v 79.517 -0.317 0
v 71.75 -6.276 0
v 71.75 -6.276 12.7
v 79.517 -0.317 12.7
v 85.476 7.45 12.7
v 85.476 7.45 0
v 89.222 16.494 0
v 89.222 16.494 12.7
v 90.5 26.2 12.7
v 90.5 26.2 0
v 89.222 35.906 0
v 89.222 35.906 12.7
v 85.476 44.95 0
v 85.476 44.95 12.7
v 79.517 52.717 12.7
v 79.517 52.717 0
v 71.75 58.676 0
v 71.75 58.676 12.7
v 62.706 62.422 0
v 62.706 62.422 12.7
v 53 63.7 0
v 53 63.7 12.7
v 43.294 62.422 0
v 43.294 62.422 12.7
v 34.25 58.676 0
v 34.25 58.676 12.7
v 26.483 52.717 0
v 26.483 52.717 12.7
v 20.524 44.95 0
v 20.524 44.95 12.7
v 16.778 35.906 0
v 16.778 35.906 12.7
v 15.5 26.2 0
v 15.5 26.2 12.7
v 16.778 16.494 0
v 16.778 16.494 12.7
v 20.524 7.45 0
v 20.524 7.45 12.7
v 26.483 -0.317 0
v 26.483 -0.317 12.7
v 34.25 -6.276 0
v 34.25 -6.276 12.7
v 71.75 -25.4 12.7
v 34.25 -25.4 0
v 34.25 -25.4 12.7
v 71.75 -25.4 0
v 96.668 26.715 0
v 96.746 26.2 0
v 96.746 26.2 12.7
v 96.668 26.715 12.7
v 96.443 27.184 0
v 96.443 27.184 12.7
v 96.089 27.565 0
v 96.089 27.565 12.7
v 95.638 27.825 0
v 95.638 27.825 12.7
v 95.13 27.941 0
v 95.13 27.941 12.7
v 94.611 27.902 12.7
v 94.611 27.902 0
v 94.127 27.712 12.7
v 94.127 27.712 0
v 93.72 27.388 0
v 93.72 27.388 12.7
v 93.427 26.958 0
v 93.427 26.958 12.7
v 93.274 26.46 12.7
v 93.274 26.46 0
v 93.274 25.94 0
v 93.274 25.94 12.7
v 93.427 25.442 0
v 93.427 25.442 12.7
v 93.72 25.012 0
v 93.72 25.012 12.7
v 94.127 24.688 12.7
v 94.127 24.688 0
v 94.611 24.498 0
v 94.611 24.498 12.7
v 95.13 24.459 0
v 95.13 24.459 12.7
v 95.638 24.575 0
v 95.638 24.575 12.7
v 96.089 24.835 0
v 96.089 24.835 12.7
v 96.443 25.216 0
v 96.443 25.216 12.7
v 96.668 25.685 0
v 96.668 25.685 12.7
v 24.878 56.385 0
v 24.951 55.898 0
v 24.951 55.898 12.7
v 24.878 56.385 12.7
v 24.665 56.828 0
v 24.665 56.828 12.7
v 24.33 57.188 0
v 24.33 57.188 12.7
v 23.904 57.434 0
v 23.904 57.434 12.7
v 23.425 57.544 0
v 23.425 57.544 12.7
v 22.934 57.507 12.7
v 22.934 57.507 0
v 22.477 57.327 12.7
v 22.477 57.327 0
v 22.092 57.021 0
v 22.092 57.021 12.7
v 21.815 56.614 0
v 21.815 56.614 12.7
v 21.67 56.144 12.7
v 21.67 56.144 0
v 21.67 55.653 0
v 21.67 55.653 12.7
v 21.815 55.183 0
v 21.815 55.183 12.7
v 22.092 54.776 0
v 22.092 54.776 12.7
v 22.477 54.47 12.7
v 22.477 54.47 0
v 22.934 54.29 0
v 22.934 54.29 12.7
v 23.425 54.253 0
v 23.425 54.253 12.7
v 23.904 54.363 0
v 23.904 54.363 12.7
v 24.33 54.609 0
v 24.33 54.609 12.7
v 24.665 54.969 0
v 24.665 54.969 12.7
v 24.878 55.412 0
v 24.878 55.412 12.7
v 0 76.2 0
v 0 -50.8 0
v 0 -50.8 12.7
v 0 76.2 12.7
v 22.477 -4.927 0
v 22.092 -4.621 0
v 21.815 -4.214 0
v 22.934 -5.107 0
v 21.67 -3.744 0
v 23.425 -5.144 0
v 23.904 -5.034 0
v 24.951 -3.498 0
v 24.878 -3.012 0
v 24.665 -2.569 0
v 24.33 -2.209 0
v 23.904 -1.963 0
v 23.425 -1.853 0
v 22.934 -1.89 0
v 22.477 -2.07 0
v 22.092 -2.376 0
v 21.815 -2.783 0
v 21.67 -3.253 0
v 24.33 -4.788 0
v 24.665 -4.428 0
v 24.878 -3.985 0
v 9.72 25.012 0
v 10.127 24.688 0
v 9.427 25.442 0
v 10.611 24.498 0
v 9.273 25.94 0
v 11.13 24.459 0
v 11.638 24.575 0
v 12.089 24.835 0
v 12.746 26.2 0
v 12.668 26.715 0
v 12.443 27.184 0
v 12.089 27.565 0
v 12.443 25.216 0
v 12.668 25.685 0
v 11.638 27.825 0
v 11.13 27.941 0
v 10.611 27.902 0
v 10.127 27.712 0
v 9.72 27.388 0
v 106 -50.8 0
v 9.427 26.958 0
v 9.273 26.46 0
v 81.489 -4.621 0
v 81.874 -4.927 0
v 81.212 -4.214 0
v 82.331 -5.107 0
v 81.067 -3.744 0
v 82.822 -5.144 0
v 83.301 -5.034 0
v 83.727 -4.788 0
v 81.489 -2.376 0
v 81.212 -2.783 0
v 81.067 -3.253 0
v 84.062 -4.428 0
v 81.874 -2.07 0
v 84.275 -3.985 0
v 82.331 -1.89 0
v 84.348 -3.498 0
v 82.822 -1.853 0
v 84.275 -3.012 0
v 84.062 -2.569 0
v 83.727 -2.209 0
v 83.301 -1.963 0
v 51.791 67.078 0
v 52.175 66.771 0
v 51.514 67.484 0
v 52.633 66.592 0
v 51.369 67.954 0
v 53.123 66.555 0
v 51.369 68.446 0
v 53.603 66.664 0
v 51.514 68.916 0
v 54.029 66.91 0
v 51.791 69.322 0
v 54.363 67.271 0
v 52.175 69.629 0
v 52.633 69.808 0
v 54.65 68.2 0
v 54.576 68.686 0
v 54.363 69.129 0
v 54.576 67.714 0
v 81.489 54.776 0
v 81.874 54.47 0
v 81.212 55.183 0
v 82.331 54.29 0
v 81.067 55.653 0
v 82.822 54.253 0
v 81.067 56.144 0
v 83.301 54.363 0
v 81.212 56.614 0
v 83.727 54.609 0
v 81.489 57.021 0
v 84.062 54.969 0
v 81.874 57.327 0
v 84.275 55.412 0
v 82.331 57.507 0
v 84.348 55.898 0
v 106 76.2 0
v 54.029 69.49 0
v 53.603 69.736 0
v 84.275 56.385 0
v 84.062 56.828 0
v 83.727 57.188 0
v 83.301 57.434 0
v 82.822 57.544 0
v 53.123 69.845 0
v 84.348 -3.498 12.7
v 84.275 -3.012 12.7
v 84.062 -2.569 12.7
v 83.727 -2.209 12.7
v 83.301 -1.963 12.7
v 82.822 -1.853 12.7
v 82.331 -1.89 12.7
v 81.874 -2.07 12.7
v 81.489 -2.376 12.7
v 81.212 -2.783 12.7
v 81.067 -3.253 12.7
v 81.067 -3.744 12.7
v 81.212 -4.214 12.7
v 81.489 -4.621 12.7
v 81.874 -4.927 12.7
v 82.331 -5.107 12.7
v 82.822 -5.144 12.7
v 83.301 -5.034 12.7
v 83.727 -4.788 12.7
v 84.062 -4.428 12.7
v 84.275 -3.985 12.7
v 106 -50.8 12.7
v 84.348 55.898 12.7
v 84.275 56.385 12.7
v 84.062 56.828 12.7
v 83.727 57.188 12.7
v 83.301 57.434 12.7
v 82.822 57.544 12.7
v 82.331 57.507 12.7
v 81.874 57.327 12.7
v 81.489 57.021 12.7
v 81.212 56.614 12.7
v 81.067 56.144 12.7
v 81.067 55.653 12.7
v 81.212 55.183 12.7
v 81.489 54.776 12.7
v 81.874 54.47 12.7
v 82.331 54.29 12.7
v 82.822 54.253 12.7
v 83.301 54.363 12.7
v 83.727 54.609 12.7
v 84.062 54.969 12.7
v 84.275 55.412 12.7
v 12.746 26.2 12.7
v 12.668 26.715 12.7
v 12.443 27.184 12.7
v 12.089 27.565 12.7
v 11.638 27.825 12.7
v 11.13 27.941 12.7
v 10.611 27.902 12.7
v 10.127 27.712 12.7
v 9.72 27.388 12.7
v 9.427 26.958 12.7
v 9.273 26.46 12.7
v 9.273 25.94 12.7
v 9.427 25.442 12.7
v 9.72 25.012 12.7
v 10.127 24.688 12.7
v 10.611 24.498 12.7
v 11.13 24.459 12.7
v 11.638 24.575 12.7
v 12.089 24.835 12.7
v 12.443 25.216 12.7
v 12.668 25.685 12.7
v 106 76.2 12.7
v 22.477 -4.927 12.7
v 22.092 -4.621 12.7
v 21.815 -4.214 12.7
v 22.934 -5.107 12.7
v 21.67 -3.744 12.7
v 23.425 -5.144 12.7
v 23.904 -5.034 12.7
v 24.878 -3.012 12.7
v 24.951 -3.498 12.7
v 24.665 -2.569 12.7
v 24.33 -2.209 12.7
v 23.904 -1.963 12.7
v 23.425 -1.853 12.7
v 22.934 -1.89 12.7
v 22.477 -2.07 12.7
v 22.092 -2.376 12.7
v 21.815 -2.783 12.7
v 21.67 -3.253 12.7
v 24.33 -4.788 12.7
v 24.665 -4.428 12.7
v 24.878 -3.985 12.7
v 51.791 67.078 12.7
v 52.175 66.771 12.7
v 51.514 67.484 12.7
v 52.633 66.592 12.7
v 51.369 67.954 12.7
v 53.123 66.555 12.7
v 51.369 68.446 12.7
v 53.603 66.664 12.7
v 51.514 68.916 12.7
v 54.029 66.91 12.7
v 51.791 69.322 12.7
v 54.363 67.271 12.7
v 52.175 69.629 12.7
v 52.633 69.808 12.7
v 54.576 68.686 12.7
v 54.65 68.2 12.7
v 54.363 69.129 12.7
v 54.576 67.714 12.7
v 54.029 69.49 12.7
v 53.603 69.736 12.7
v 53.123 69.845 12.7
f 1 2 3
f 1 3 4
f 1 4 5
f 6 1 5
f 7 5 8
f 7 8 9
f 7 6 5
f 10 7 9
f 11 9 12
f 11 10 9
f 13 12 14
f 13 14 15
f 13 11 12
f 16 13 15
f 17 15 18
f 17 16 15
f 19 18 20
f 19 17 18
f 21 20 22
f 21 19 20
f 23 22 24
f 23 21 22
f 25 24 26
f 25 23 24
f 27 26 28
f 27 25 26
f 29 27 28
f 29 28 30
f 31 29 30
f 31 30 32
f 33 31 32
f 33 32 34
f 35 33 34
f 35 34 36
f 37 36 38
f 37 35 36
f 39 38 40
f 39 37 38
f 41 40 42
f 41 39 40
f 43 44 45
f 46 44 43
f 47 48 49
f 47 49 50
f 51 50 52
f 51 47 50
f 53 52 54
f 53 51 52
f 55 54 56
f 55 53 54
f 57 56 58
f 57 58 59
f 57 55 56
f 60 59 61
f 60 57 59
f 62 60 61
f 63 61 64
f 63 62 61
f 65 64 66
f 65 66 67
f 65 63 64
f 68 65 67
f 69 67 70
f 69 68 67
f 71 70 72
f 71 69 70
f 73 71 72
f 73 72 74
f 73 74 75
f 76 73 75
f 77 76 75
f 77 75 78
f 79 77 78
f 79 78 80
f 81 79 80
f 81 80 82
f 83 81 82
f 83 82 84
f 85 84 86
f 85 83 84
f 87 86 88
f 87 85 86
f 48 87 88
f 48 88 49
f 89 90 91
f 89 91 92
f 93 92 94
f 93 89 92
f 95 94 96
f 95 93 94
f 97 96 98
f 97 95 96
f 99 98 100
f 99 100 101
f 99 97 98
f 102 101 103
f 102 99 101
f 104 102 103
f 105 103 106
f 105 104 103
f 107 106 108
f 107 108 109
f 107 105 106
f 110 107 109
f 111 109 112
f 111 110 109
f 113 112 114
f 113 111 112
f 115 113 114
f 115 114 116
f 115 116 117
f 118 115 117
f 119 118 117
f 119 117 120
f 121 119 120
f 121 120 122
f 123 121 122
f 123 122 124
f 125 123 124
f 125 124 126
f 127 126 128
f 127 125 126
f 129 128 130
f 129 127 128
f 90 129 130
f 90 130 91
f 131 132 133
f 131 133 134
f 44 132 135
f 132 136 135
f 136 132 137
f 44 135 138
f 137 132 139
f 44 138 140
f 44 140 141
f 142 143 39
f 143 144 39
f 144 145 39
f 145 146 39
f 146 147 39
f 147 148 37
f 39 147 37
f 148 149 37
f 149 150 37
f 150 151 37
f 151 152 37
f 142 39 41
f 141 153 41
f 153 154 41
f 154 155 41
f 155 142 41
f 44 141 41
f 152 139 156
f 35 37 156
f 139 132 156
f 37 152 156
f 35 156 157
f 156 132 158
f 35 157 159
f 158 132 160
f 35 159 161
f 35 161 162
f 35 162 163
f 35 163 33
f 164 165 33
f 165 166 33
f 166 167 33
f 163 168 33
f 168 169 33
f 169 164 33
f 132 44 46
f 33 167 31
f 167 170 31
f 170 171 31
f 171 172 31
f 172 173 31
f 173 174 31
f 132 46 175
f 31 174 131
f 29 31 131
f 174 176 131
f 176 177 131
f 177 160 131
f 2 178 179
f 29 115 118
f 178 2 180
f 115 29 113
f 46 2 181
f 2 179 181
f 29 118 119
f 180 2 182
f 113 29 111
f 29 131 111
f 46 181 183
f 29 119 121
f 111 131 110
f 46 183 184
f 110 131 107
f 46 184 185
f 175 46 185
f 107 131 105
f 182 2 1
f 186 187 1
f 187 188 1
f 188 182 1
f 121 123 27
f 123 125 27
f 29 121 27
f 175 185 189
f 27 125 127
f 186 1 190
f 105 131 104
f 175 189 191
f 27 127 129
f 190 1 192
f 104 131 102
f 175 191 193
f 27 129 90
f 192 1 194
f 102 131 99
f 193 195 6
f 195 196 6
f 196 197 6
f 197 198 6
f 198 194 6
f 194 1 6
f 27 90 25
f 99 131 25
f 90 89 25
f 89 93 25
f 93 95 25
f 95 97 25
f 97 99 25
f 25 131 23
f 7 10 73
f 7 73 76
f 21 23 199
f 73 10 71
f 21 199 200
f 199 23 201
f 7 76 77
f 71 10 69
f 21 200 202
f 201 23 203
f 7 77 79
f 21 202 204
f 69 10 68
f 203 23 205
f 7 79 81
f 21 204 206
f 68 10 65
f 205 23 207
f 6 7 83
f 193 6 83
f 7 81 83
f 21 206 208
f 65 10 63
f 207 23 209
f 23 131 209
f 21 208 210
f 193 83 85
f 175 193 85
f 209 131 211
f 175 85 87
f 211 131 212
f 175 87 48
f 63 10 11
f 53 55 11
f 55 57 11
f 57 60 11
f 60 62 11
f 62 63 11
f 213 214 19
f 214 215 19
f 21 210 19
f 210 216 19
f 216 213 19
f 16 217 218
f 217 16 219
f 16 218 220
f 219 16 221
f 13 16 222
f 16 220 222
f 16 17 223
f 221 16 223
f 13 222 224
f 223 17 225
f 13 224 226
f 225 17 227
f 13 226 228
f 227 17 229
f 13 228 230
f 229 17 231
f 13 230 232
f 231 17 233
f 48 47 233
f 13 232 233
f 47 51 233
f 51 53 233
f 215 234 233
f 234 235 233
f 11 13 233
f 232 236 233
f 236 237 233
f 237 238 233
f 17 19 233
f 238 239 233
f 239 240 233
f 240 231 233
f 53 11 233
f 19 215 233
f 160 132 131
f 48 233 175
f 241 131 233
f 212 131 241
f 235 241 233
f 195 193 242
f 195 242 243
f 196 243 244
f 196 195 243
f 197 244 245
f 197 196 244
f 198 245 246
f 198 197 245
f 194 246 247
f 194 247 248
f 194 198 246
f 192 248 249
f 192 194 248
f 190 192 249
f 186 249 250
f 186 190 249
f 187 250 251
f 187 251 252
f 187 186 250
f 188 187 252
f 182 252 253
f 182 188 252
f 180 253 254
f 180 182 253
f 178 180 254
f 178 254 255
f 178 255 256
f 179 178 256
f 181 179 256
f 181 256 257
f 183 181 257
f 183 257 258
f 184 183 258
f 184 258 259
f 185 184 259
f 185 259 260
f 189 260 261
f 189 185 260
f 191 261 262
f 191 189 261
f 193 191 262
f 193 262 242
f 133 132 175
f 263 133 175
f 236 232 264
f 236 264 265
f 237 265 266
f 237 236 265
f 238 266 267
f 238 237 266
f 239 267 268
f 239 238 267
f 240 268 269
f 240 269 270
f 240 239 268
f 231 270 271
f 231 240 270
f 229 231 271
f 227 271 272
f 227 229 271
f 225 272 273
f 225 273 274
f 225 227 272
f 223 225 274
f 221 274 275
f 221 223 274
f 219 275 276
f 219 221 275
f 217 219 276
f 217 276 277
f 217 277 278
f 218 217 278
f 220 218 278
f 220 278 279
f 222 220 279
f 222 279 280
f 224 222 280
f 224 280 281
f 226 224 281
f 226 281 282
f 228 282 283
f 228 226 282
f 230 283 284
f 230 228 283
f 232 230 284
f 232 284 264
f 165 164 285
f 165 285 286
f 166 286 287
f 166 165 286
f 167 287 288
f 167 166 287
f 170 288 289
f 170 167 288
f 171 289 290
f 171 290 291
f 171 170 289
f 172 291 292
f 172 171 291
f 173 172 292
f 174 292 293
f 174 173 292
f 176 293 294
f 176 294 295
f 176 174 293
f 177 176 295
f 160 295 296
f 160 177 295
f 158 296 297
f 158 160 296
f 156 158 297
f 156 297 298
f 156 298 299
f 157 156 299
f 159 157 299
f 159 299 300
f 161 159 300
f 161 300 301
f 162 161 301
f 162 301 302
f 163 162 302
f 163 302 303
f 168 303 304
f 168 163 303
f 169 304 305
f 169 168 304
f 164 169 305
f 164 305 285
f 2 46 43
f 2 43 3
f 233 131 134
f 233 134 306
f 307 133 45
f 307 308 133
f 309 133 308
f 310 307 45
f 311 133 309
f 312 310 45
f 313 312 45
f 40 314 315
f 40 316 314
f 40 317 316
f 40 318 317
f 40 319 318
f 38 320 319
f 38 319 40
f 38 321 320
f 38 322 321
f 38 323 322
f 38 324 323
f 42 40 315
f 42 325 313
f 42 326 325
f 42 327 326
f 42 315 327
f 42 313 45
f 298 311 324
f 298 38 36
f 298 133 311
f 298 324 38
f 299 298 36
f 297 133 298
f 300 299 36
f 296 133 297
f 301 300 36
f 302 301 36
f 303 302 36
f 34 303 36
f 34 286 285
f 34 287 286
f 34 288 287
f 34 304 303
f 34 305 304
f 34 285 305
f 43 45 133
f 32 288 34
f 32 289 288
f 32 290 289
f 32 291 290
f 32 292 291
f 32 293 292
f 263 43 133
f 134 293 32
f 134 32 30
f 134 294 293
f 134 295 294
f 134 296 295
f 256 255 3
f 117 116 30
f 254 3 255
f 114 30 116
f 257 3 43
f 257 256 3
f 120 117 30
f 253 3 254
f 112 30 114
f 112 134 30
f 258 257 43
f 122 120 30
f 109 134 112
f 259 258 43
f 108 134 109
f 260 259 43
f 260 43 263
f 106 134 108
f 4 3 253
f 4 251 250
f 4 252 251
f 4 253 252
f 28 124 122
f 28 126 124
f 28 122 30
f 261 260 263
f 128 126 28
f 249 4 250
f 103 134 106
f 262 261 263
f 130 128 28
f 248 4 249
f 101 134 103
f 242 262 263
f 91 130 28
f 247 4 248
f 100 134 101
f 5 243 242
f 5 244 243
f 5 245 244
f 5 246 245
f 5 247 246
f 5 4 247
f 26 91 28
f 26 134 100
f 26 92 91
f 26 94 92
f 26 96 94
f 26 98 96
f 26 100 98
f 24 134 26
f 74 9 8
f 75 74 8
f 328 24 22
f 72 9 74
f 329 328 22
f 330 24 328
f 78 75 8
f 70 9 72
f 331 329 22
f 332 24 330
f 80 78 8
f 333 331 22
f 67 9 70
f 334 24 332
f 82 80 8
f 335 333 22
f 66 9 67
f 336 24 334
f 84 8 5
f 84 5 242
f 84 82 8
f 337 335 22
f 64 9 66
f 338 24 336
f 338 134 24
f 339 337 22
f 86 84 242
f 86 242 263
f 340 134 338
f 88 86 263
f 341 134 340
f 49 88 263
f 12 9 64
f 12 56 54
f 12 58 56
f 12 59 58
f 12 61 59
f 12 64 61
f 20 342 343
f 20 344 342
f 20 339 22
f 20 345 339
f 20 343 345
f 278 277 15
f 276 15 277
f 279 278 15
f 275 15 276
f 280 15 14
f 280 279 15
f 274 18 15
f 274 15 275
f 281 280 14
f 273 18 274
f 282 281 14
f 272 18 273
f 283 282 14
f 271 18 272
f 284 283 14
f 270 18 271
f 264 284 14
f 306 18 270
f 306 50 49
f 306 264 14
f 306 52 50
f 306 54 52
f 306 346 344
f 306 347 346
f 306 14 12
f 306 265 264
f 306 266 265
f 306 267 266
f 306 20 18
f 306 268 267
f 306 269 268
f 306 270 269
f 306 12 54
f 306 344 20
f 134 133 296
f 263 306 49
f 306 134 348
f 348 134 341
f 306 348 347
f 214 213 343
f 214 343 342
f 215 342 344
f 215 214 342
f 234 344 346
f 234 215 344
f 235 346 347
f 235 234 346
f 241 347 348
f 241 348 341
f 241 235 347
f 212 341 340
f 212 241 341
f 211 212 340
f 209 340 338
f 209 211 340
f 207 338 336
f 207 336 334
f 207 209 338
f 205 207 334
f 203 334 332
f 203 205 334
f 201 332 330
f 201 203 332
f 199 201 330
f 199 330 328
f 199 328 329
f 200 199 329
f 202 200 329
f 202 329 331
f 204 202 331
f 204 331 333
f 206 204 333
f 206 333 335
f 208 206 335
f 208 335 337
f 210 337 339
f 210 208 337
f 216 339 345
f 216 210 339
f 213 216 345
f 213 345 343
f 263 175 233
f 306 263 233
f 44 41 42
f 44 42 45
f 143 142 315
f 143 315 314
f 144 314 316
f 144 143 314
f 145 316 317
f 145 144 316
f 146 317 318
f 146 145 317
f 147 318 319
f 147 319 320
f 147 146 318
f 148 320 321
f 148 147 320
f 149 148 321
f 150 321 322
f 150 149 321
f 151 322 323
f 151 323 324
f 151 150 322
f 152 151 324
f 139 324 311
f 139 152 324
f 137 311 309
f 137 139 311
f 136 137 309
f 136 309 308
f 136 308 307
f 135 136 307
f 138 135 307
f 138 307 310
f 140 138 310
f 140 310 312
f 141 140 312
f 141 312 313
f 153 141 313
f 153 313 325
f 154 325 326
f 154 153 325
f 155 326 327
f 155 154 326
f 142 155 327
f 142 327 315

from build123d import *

# Parameters (mm, degrees)
SKETCH1_W           = 106
SKETCH1_H           = 127
SKETCH1_R           = 1.64973
SKETCH1_R_2         = 1.746
BOSS_EXTRUDE1_DEPTH = 12.7


with BuildPart() as part:
    # Sketch1 → Boss-Extrude1 (new body)
    with BuildSketch(Plane.XY):
        with Locations((53, 12.7)):
            Rectangle(SKETCH1_W, SKETCH1_H)
        with Locations((82.698486542, 55.898482492)):
            Circle(SKETCH1_R, mode=Mode.SUBTRACT)
        with Locations((95.00000245, 26.19999595)):
            Circle(SKETCH1_R_2, mode=Mode.SUBTRACT)
        with Locations((82.698486542, -3.498490592)):
            Circle(SKETCH1_R, mode=Mode.SUBTRACT)
        with Locations((23.301513458, -3.498490592)):
            Circle(SKETCH1_R, mode=Mode.SUBTRACT)
        with Locations((10.99999755, 26.1999984)):
            Circle(SKETCH1_R_2, mode=Mode.SUBTRACT)
        with Locations((23.301513458, 55.898482492)):
            Circle(SKETCH1_R, mode=Mode.SUBTRACT)
        with Locations((53, 68.1999984)):
            Circle(SKETCH1_R, mode=Mode.SUBTRACT)
        with BuildLine():
            Line((34.25, -6.275954242), (34.25, -25.4))
            Line((34.25, -25.4), (71.75, -25.4))
            Line((71.75, -25.4), (71.75, -6.275954242))
            ThreePointArc((71.75, -6.275954242), (53, 63.6999984), (34.25, -6.275954242))
        make_face(mode=Mode.SUBTRACT)
    extrude(amount=BOSS_EXTRUDE1_DEPTH)


solid = part.part
